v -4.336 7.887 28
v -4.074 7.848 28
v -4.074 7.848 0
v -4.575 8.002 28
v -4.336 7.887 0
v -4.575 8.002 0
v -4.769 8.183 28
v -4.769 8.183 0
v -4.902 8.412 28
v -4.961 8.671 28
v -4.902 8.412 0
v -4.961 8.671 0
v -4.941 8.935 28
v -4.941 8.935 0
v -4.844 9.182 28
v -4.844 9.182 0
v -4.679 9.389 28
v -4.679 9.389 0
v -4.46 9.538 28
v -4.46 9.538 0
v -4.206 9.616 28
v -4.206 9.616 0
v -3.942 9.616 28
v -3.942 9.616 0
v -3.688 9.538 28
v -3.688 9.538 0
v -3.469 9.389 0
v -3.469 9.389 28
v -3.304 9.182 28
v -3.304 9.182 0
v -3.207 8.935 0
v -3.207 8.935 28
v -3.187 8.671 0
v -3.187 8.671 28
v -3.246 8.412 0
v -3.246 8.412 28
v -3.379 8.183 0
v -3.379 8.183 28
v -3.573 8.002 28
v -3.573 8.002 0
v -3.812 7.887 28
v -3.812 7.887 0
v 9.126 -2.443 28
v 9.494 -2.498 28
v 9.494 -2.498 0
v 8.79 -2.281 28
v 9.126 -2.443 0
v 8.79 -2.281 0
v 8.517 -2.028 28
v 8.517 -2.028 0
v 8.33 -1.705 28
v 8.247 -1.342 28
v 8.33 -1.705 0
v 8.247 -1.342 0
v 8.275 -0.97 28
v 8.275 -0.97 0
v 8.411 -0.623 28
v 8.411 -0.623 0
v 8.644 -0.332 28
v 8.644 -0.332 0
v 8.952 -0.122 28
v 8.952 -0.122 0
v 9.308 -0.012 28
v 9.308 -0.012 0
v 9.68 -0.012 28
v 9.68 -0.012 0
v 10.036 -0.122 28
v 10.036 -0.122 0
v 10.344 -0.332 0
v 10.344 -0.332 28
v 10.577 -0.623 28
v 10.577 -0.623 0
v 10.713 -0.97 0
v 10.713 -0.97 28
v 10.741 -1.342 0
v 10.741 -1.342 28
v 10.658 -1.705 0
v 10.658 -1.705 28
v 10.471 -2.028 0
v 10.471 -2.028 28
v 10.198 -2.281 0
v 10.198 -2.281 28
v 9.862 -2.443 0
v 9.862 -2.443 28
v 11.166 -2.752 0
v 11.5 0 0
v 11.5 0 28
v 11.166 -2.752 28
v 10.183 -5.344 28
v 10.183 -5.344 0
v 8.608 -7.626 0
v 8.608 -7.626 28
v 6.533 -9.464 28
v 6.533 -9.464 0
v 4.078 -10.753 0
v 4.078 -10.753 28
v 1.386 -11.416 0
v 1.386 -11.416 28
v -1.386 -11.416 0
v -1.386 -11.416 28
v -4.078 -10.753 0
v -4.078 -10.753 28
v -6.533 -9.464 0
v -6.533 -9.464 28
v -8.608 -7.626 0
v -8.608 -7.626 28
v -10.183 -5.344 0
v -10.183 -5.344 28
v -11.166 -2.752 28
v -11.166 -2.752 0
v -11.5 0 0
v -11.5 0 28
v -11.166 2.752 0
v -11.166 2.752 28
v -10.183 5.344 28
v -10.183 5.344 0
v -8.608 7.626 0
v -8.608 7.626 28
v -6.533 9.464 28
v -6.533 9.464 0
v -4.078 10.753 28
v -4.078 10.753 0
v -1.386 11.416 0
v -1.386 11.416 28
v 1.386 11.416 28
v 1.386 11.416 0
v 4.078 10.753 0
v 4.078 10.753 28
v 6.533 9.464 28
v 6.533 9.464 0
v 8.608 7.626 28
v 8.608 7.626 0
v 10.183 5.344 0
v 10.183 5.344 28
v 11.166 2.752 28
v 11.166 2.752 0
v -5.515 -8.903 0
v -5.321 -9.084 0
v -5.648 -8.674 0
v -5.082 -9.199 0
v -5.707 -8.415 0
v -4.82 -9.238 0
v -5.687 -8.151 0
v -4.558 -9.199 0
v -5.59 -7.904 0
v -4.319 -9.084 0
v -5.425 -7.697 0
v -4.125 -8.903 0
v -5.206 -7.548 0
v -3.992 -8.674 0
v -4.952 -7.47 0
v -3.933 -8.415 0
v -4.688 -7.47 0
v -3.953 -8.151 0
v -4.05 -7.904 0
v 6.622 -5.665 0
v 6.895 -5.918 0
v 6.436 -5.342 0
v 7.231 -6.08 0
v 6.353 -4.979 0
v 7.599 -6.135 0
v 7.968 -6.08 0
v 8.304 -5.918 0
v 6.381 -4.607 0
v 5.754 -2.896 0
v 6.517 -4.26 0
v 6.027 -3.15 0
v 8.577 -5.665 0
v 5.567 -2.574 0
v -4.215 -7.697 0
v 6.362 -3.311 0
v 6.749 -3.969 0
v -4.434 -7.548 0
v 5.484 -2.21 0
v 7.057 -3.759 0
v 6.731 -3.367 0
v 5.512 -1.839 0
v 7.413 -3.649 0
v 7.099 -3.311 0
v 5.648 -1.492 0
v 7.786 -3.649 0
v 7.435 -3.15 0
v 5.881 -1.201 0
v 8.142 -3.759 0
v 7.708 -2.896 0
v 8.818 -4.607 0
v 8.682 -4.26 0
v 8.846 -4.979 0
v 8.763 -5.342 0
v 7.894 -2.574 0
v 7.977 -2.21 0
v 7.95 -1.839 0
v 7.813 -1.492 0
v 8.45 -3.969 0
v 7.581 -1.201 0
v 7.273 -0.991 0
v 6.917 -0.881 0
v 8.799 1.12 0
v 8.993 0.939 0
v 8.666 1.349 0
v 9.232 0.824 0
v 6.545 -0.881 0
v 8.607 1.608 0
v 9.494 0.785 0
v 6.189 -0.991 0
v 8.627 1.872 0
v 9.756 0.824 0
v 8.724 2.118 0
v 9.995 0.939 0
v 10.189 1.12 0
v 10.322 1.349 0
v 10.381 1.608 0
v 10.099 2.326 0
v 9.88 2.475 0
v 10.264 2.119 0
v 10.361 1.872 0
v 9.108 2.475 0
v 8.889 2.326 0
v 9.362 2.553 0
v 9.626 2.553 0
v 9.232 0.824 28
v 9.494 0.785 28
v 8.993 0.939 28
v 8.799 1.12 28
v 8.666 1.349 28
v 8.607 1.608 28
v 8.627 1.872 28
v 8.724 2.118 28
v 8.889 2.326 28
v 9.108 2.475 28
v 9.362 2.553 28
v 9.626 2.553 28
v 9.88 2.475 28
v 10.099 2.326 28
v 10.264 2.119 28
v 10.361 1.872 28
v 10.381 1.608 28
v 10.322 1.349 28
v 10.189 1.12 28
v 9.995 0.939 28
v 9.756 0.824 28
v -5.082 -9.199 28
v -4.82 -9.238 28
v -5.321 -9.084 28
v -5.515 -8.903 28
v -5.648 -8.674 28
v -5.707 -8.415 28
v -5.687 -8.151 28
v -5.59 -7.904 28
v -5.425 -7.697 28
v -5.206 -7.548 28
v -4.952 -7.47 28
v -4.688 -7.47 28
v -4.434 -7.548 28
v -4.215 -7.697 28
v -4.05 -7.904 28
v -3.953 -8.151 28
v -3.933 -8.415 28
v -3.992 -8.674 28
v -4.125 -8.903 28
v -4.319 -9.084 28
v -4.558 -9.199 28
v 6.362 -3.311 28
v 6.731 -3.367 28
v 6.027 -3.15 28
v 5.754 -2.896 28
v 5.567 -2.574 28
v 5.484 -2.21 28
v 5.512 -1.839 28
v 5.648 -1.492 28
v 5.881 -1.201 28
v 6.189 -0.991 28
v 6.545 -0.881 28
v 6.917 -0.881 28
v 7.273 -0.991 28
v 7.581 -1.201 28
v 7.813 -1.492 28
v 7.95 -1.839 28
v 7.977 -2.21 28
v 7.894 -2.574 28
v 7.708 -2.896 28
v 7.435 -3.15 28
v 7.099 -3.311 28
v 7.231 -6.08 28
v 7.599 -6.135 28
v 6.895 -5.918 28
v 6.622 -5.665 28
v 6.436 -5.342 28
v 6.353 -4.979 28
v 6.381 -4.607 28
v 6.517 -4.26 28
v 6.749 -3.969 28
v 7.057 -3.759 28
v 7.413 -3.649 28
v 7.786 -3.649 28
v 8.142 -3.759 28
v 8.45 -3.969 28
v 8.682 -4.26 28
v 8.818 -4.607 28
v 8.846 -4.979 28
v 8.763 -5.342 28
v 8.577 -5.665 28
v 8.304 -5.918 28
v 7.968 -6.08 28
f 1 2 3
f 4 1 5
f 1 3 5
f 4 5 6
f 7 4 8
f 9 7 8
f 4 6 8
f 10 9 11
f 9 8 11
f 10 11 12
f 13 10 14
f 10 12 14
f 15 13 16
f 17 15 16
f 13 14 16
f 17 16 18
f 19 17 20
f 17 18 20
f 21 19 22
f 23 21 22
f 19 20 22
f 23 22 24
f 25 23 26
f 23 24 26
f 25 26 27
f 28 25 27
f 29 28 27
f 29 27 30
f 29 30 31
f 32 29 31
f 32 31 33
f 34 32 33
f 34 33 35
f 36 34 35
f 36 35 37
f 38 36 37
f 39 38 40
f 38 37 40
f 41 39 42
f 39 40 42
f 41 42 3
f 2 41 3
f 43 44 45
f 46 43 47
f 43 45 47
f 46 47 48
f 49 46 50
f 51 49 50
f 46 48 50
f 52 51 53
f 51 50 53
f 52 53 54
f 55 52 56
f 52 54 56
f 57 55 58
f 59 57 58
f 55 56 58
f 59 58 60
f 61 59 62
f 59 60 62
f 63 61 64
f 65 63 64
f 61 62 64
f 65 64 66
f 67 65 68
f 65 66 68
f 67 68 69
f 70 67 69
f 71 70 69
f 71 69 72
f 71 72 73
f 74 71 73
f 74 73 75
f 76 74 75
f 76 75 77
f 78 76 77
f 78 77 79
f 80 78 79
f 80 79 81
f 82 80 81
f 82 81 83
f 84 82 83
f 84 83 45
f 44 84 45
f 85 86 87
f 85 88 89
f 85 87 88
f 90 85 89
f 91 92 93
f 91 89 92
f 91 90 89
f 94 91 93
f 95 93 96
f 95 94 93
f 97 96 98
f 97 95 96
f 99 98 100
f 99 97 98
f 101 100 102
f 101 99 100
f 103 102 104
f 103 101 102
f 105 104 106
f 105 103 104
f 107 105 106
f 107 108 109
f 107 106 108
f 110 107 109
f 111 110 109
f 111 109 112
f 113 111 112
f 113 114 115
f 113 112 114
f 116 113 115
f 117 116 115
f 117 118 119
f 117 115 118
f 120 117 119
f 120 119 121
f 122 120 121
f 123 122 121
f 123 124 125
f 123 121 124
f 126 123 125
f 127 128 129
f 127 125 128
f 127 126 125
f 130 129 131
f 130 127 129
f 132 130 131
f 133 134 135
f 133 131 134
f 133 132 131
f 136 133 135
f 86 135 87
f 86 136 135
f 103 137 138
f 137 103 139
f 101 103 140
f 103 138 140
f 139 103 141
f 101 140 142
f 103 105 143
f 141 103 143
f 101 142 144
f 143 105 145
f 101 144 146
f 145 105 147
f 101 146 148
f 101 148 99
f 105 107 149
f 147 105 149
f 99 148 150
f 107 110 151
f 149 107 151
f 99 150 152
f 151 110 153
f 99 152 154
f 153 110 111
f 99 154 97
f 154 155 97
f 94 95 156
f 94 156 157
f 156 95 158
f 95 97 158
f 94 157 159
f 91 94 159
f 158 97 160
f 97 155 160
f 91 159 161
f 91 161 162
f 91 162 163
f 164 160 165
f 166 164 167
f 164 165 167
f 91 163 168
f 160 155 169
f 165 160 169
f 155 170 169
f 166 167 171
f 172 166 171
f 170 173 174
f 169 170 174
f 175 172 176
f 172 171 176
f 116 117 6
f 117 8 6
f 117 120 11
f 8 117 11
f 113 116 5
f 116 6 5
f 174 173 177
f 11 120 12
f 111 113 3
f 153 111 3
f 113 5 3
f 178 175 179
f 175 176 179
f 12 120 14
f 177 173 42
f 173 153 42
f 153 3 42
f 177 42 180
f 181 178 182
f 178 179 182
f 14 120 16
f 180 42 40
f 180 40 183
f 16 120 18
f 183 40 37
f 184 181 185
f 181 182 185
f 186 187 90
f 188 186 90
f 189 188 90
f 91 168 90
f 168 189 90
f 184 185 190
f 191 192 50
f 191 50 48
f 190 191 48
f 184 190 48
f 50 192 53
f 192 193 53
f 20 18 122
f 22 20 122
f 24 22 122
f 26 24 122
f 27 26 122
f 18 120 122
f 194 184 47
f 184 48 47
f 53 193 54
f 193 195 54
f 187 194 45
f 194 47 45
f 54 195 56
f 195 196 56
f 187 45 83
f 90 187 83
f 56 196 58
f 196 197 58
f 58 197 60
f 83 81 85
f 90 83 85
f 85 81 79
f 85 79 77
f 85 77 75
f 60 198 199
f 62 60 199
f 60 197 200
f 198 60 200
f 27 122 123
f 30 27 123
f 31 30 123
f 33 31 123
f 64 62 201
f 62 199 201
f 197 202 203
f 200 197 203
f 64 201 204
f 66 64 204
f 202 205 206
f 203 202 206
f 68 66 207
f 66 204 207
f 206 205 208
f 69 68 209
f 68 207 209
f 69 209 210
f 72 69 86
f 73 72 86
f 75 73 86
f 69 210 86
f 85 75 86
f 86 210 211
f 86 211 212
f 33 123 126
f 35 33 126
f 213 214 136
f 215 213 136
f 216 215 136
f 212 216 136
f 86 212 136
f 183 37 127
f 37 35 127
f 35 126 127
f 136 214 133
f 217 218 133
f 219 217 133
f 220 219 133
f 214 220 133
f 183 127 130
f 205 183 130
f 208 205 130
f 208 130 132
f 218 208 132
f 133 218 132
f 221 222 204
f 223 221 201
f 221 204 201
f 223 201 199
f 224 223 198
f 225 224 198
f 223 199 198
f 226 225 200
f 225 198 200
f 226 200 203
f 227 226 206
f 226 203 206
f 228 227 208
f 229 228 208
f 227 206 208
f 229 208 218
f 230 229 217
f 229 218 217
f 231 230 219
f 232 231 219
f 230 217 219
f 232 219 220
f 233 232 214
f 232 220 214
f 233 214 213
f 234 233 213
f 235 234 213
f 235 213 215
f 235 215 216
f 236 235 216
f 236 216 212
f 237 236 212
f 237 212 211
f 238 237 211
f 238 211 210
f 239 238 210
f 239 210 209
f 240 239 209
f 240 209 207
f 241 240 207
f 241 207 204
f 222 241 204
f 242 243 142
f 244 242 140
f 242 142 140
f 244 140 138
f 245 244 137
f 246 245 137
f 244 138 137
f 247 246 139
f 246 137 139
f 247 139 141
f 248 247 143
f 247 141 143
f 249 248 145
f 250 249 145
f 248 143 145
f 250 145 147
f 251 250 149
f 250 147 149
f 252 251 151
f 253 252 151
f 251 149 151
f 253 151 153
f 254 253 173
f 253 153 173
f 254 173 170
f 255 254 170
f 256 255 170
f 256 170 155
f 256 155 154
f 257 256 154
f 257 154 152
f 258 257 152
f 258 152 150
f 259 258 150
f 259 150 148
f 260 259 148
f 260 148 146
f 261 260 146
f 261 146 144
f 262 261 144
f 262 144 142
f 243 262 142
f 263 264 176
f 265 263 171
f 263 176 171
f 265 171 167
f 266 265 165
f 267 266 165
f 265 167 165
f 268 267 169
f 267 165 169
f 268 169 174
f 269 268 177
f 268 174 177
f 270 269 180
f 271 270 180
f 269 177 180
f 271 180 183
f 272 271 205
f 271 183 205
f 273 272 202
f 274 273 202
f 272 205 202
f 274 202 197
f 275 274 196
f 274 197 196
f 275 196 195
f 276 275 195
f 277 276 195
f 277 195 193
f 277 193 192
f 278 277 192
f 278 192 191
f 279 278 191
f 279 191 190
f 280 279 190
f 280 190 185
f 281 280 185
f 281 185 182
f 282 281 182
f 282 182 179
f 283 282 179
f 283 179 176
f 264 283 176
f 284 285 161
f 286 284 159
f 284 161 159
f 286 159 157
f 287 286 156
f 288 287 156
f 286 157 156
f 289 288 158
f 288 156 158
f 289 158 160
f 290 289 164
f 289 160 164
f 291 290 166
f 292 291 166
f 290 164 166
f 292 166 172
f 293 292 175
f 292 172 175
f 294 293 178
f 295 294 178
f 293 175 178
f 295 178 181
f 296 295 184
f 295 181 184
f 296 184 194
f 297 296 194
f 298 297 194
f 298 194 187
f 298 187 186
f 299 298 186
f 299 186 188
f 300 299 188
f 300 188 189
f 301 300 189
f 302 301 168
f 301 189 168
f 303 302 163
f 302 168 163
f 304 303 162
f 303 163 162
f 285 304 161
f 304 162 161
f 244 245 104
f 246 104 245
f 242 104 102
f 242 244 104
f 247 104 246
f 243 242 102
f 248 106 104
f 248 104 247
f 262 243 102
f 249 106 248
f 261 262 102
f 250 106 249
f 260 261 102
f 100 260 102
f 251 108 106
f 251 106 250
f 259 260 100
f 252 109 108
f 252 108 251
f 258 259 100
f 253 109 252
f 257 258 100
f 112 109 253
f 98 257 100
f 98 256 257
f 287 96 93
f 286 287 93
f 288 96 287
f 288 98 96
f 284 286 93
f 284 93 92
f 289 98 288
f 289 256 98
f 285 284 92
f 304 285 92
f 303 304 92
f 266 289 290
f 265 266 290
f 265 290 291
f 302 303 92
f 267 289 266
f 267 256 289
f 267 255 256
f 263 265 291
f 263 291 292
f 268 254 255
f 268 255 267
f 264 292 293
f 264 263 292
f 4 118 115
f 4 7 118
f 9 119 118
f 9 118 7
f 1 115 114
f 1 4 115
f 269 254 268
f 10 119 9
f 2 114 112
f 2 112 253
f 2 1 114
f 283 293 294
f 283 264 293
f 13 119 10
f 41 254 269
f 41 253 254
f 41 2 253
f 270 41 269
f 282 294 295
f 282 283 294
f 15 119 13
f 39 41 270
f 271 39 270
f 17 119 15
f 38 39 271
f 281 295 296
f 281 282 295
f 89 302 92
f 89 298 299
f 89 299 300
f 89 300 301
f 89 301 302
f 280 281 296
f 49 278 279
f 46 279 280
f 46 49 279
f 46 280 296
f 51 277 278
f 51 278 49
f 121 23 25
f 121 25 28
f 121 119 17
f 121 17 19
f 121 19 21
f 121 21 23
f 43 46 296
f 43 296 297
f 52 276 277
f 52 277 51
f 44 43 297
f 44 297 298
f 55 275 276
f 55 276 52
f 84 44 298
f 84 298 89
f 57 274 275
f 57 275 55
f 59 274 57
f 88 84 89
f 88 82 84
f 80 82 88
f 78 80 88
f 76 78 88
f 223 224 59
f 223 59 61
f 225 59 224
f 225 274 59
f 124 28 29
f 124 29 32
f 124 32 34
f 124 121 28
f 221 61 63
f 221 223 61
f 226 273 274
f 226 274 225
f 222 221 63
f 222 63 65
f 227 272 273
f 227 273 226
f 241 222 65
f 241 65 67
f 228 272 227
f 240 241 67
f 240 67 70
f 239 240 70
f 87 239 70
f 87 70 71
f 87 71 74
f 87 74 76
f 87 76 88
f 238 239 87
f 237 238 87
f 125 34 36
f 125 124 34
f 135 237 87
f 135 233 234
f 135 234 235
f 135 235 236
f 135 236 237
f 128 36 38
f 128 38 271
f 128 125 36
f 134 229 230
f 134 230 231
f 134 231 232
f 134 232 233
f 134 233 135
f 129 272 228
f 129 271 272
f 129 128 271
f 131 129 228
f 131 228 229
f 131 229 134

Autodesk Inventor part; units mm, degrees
ref_plane "YZ Plane" through (0, 0, 0) normal (1, 0, 0) x (0, 1, 0)
ref_plane "XZ Plane" through (0, 0, 0) normal (0, 1, 0) x (-1, 0, 0)
ref_plane "XY Plane" through (0, 0, 0) normal (0, 0, 1) x (1, 0, 0)
sketch "Sketch1" plane through (0, 0, 0) normal (0, 0, 1) x (1, 0, 0)
  circle A0 centre (0, 0) radius 11.5
  dimension "d0" = 23
extrude "Extrusion1" add sketch "Sketch1" along normal blind 28
sketch "Sketch2" plane through (0, 0, 28) normal (0, 0, 1) x (1, 0, 0)
  circle A0 centre (0, 0) radius 11.5 projected
  line L0 (0, -16.1) -> (0, 16.1) projected
  line L1 (-16.1, 0) -> (16.1, 0) projected
  point P0 (0, 9.69)
  point P1 (-8.3918, -4.845)
  point P2 (8.3918, -4.845)
  point P3 (-4.074, 8.737)
  point P4 (-4.82, -8.349)
  point P5 (9.494, 1.674)
  dimension "d3" = 9.69
  dimension "d6" = 360
  dimension "d8" = 8.737
  dimension "d9" = 4.074
  dimension "d10" = 4.82
  dimension "d11" = 8.349
  dimension "d12" = 9.494
  dimension "d13" = 1.674
hole "Hole1" at (-4.074, 8.737, 28) at (-4.82, -8.349, 28) at (9.494, 1.674, 28) direction (0, 0, -1) diameter 1.778 end through all clearance for "Flat Head Machine Screw (82)" size "#0" standard "Ansi Unified Screw Threads"
sketch "Sketch3" plane through (0, 0, 28) normal (0, 0, 1) x (1, 0, 0)
  circle A0 centre (9.494, 1.674) radius 0.889 projected
  circle A1 centre (-4.82, -8.349) radius 0.889 projected
  circle A2 centre (-4.074, 8.737) radius 0.889 projected
  circle A3 centre (0, 0) radius 11.5 projected
  circle A4 centre (0, 0) radius 11.5
  point P0 (0, 9.69)
  point P1 (-8.3918, -4.845)
  point P2 (8.3918, -4.845)
  point P3 (4.074, -8.737)
  point P4 (4.82, 8.349)
  point P5 (-9.494, -1.674)
  dimension "d23" = 360
  dimension "d24" = -8.737
  dimension "d25" = 8.349
  dimension "d26" = 1.674
  dimension "d27" = 4.074
  dimension "d28" = 4.82
sketch "Sketch4" plane through (0, 0, 28) normal (0, 0, 1) x (1, 0, 0)
  point P0 (9.494, -1.2485)
  point P1 (6.7309, -2.117)
  point P2 (7.5994, -4.8853)
hole "Hole2" at (9.494, -1.2485, 28) at (6.7309, -2.117, 28) at (7.5994, -4.8853, 28) direction (0, 0, -1) diameter 2.5 end through all
properties part number "Connector_PCB"
